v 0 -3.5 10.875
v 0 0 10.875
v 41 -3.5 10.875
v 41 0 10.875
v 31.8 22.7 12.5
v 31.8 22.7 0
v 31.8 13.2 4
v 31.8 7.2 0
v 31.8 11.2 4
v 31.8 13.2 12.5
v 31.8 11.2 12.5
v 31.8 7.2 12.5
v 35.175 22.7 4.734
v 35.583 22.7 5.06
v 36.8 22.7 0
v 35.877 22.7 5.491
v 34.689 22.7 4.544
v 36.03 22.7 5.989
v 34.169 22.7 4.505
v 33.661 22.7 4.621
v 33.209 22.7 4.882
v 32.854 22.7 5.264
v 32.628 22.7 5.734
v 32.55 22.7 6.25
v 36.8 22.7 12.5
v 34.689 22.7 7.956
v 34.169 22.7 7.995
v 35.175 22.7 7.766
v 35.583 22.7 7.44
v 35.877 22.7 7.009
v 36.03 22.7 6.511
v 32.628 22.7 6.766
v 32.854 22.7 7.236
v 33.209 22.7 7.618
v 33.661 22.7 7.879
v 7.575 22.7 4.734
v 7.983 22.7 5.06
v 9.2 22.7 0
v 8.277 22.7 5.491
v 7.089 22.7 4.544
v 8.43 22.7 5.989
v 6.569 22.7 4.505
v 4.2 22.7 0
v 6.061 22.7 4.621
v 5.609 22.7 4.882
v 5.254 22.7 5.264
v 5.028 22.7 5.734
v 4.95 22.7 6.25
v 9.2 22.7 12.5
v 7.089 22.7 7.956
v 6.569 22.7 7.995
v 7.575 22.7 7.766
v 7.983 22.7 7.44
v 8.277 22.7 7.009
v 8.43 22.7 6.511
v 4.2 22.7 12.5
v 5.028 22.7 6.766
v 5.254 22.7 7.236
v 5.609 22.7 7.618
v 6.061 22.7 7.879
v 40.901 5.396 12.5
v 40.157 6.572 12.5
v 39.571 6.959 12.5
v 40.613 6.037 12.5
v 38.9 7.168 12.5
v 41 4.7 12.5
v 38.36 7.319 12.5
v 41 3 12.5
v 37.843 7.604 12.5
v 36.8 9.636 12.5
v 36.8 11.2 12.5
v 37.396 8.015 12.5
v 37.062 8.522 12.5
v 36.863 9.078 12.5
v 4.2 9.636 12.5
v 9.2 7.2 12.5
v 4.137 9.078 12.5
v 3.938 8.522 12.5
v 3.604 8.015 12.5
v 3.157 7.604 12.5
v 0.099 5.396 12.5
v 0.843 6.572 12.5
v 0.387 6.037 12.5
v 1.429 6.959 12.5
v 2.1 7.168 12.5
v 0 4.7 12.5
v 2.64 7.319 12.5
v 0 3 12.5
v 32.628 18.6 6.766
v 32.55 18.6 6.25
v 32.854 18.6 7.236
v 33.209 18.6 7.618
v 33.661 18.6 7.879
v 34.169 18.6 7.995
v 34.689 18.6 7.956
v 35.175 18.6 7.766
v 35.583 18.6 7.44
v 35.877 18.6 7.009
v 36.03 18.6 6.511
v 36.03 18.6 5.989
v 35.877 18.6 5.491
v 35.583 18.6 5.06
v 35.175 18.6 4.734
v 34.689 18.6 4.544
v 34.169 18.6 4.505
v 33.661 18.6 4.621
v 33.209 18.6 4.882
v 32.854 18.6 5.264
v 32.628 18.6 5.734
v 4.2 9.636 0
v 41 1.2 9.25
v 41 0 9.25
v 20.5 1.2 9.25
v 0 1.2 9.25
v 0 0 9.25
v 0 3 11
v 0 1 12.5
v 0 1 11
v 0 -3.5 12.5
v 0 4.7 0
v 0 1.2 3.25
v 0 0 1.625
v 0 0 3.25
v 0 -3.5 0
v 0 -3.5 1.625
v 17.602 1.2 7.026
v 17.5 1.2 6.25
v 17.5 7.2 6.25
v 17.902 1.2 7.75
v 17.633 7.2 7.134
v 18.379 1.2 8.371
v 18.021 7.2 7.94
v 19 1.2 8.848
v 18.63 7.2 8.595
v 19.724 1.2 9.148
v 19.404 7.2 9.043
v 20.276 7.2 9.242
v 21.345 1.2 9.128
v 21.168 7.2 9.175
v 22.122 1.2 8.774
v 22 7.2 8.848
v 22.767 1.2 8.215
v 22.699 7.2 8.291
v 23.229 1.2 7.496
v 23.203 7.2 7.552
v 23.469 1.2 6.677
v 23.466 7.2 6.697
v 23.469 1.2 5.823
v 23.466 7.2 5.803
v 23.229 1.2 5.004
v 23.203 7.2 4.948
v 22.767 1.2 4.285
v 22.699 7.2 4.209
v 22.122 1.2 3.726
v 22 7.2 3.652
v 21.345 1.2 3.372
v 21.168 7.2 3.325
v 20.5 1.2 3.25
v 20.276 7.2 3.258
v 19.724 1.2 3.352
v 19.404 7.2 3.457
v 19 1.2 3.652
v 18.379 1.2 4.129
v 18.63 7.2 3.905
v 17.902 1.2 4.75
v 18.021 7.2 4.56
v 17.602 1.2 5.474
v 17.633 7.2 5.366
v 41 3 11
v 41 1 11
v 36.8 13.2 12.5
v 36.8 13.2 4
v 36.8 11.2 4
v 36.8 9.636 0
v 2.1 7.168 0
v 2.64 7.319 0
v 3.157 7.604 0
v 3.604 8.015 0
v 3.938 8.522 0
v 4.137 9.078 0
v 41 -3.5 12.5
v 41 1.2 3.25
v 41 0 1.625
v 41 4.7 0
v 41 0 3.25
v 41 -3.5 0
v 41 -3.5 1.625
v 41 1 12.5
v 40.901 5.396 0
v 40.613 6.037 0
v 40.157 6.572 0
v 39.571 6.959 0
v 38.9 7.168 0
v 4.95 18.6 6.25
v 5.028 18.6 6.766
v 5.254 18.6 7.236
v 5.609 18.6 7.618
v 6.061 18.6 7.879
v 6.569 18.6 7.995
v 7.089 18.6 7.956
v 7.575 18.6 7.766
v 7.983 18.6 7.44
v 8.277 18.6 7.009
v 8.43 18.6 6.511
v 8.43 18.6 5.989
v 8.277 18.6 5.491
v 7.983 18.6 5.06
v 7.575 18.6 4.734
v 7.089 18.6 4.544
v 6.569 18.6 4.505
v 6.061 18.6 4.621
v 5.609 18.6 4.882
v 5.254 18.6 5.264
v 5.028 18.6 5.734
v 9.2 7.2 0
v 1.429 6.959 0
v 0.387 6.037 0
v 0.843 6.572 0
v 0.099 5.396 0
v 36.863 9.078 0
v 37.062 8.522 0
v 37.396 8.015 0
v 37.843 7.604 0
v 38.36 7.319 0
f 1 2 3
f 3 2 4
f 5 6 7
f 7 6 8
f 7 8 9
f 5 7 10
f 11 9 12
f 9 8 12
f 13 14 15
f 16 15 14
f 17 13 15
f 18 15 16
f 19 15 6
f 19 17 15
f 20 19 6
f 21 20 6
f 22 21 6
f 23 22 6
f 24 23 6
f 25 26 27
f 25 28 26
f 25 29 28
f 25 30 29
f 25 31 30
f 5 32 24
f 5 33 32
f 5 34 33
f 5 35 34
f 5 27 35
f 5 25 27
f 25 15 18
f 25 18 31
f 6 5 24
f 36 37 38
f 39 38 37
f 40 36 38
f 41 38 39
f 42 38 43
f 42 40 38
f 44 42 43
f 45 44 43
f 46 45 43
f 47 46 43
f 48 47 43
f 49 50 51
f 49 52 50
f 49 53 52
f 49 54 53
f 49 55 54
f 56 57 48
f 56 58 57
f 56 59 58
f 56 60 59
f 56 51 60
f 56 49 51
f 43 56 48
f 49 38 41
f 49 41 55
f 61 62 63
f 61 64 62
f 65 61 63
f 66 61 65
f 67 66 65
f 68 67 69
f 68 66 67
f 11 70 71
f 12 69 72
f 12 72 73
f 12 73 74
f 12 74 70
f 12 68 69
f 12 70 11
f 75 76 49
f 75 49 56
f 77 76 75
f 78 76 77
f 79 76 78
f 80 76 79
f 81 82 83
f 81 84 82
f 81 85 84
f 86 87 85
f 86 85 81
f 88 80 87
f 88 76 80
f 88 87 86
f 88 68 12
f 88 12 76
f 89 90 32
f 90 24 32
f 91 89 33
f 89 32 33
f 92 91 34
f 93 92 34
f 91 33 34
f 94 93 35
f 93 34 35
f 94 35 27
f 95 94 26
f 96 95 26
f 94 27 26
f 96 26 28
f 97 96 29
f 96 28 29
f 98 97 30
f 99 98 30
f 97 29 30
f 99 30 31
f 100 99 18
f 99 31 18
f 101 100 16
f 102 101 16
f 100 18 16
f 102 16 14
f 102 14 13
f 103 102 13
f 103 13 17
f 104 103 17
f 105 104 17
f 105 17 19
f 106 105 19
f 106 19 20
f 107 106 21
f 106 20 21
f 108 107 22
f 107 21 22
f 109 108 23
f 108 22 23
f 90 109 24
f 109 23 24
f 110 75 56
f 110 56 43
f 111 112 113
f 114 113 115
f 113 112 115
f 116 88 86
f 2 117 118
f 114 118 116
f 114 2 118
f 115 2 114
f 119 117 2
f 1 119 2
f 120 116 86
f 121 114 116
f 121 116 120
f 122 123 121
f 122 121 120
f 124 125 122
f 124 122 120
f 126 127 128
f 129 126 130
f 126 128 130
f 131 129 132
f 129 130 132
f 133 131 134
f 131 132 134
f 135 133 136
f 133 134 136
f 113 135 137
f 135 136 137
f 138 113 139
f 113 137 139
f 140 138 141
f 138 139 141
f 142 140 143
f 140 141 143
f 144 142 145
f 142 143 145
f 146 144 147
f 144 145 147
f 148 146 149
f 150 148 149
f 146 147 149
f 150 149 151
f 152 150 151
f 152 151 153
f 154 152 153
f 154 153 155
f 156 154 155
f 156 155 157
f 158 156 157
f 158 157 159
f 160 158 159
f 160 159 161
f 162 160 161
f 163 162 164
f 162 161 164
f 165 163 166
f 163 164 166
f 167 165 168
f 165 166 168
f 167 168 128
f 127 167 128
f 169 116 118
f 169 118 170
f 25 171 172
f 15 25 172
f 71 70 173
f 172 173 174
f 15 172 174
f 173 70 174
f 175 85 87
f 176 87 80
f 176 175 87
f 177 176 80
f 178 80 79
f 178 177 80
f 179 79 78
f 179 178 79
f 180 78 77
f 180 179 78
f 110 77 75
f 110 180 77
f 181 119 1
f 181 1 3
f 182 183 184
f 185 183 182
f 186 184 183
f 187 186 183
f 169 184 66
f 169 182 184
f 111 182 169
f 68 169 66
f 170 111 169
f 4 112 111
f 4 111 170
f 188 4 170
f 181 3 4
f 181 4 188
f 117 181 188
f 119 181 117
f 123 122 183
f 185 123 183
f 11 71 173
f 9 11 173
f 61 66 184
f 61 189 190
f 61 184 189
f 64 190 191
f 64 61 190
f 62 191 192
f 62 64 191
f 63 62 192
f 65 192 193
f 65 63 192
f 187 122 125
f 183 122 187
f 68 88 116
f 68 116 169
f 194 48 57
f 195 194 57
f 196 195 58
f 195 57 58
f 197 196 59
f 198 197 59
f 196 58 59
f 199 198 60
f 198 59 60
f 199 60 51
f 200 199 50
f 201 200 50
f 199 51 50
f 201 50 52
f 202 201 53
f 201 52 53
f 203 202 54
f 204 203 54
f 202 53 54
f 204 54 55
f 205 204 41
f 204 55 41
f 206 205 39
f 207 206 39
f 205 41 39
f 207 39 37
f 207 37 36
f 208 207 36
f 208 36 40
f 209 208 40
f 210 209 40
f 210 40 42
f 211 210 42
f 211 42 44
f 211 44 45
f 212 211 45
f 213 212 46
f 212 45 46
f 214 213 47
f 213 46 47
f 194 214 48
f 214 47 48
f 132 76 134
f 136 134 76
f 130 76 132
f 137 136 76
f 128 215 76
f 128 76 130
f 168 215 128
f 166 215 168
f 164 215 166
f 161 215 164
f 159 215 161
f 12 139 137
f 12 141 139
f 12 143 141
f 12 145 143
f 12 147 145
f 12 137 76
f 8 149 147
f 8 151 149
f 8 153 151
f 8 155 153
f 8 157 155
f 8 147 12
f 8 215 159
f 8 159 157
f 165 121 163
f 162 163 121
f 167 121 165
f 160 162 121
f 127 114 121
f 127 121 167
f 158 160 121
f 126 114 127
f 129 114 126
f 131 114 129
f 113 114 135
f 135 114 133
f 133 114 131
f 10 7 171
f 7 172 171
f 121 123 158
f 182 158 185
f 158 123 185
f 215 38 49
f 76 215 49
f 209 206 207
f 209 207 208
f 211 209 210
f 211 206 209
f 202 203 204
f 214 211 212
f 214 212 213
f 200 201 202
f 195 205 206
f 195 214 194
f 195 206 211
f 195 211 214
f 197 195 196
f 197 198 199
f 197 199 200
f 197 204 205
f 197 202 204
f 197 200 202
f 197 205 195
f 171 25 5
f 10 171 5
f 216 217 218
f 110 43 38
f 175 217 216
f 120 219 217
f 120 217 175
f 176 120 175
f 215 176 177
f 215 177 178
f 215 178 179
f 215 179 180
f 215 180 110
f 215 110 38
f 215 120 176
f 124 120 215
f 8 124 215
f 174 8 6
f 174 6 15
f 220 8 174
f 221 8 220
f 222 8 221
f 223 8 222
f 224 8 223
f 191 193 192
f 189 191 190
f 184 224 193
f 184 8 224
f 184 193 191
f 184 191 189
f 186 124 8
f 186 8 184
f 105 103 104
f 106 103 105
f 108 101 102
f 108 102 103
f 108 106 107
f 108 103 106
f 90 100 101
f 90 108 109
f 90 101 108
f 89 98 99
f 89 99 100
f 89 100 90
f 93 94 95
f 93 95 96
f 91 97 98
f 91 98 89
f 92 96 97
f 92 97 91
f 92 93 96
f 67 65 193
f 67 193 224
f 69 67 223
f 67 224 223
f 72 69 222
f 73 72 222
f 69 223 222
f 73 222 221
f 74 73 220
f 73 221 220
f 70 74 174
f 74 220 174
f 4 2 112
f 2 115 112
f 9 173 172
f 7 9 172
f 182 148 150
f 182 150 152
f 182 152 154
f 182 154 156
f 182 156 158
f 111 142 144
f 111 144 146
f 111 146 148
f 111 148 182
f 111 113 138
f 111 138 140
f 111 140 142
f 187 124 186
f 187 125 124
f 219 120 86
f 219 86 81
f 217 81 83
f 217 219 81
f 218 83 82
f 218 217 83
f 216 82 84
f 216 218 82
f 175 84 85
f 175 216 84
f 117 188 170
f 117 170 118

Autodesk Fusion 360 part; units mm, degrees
sketch "Sketch1" plane through (0, 0, 0) normal (0, 1, 0) x (1, 0, 0)
  line L0 (0, 0) -> (41, 0)
  line L1 (41, 0) -> (41, -12.5)
  line L2 (41, -12.5) -> (0, -12.5)
  line L3 (0, -12.5) -> (0, 0)
  dimension "d1" = 41
  dimension "d2" = 12.5
extrude "Extrude1" add sketch "Sketch1" along normal blind 7.2
sketch "Sketch2" plane through (0, 0, 0) normal (0, -1, 0) x (1, 0, 0)
  line L0 (41, 12.5) -> (0, 12.5)
  line L1 (0, 12.5) -> (0, 0)
  line L2 (0, 0) -> (41, 0)
  line L3 (41, 0) -> (41, 12.5)
  line L4 (41, 9.25) -> (0, 9.25)
  line L5 (0, 9.25) -> (0, 3.25)
  line L6 (0, 3.25) -> (41, 3.25)
  line L7 (41, 3.25) -> (41, 9.25)
  dimension "d5" = 6
extrude "Extrude2" cut sketch "Sketch2" against normal blind 1.2 contours L1 L3 L4 L5 L6 L7
sketch "Sketch3" plane through (0, 7.2, 0) normal (0, 1, 0) x (-1, 0, 0)
  line L0 (0, 12.5) -> (-41, 12.5)
  line L1 (-41, 12.5) -> (-41, 0)
  line L2 (-41, 0) -> (0, 0)
  line L3 (0, 0) -> (0, 12.5)
  circle A0 centre (-20.5, 6.25) radius 3
  dimension "d8" = 6
  dimension "d9" = 6.25
  dimension "d10" = 20.5
extrude "Extrude3" cut sketch "Sketch3" against normal blind 6 contours A0
sketch "Sketch4" plane through (0, 0, 0) normal (0, -1, 0) x (1, 0, 0)
  line L0 (0, 9.25) -> (41, 9.25)
  line L1 (41, 9.25) -> (41, 12.5)
  line L2 (41, 12.5) -> (0, 12.5)
  line L3 (0, 12.5) -> (0, 9.25)
  line L4 (41, 1.625) -> (0, 1.625)
  line L5 (0, 1.625) -> (0, 10.875)
  line L6 (0, 10.875) -> (41, 10.875)
  line L7 (41, 10.875) -> (41, 1.625)
  arc A0 (20.5, 3.25) -> (20.5, 9.25) centre (20.5, 6.25) ccw
  line L8 (20.5, 3.25) -> (41, 3.25)
  line L9 (41, 3.25) -> (41, 9.25)
  line L10 (41, 9.25) -> (20.5, 9.25)
  line L11 (0, 0) -> (41, 0)
  dimension "d13" = 9.25
  dimension "d14" = 1.625
sketch "Sketch5" plane through (0, 0, 0) normal (0, -1, 0) x (1, 0, 0)
  line L0 (41, 3.25) -> (0, 3.25)
  line L1 (0, 3.25) -> (0, 0)
  line L2 (0, 0) -> (41, 0)
  line L3 (41, 0) -> (41, 3.25)
sketch "Sketch6" plane through (20.5, 0, 1.625) normal (0, -1, 0) x (1, 0, 0)
  line L0 (20.5, -1.625) -> (-20.5, -1.625)
  line L1 (-20.5, -1.625) -> (-20.5, 0)
  line L2 (-20.5, 0) -> (20.5, 0)
  line L3 (20.5, 0) -> (20.5, -1.625)
  point P0 (20.5, -1.625)
  point P1 (-20.5, 0)
extrude "Extrude4" add sketch "Sketch6" sketch "Sketch4" along normal blind 3.5 of sketch 2 contours L1 L2 L3 L6
sketch "Sketch7" plane through (0, 7.2, 0) normal (0, 1, 0) x (-1, 0, 0)
  circle A0 centre (-20.5, 6.25) radius 3
  line L0 (0, 12.5) -> (-41, 12.5)
  line L1 (-41, 12.5) -> (-41, 0)
  line L2 (-41, 0) -> (0, 0)
  line L3 (0, 0) -> (0, 12.5)
  line L4 (-4.2, 0) -> (-9.2, 0)
  line L5 (-9.2, 0) -> (-9.2, 12.5)
  line L6 (-9.2, 12.5) -> (-4.2, 12.5)
  line L7 (-4.2, 12.5) -> (-4.2, 0)
  line L8 (-36.8, 0) -> (-31.8, 0)
  line L9 (-31.8, 0) -> (-31.8, 12.5)
  line L10 (-31.8, 12.5) -> (-36.8, 12.5)
  line L11 (-36.8, 12.5) -> (-36.8, 0)
  dimension "d17" = 5
  dimension "d18" = 5
  dimension "d19" = 22.6
  dimension "d20" = 4.2
extrude "Extrude5" add sketch "Sketch7" along normal blind 15.5 contours L0 L2 L4 L5 L6 L7 | L0 L2 L8 L9 L10 L11
sketch "Sketch8" plane through (36.8, 0, 0) normal (1, 0, 0) x (0, 0, -1)
  line L0 (-12.5, 7.2) -> (0, 7.2)
  line L1 (0, 7.2) -> (0, 22.7)
  line L2 (0, 22.7) -> (-12.5, 22.7)
  line L3 (-12.5, 22.7) -> (-12.5, 7.2)
  line L4 (-12.5, 11.2) -> (-4, 11.2)
  line L5 (-4, 11.2) -> (-4, 13.2)
  line L6 (-4, 13.2) -> (-12.5, 13.2)
  line L7 (-12.5, 13.2) -> (-12.5, 11.2)
  dimension "d23" = 8.5
  dimension "d24" = 2
  dimension "d25" = 4
extrude "Extrude6" cut sketch "Sketch8" against normal blind 5 contours L3 L4 L5 L6 L7
fillet "Fillet1" radius 2.5 4 edges at (41, 7.2, 6.25) (36.8, 7.2, 6.25) (0, 7.2, 6.25) (4.2, 7.2, 6.25)
sketch "Sketch9" plane through (0, 22.7, 0) normal (0, 1, 0) x (-1, 0, 0)
  line L0 (-4.2, 12.5) -> (-9.2, 12.5)
  line L1 (-9.2, 12.5) -> (-9.2, 0)
  line L2 (-9.2, 0) -> (-4.2, 0)
  line L3 (-4.2, 0) -> (-4.2, 12.5)
  circle A0 centre (-6.7, 6.25) radius 1.75
  circle A1 centre (-34.3, 6.25) radius 1.75
  line L4 (-31.8, 0) -> (-31.8, 12.5)
  line L5 (-36.8, 0) -> (-31.8, 0)
  dimension "d30" = 3.5
  dimension "d31" = 3.5
  dimension "d32" = 2.5
  dimension "d33" = 2.5
  dimension "d34" = 6.25
  dimension "d35" = 6.25
extrude "Extrude7" cut sketch "Sketch9" against normal blind 4.1 contours A0 | A1
sketch "Sketch10" plane through (0, 0, 12.5) normal (0, 0, 1) x (1, 0, 0)
  arc A0 (2.1, 7.1678) -> (0, 4.7) centre (2.5, 4.7) ccw
  line L0 (0, 4.7) -> (0, -3.5)
  line L1 (0, -3.5) -> (41, -3.5)
  line L2 (41, -3.5) -> (41, 4.7)
  arc A1 (41, 4.7) -> (38.9, 7.1678) centre (38.5, 4.7) ccw
  arc A2 (36.8, 9.6356) -> (38.9, 7.1678) centre (39.3, 9.6356) ccw
  line L3 (36.8, 9.6356) -> (36.8, 11.2)
  line L4 (36.8, 11.2) -> (31.8, 11.2)
  line L5 (31.8, 11.2) -> (31.8, 7.2)
  line L6 (31.8, 7.2) -> (9.2, 7.2)
  line L7 (9.2, 7.2) -> (9.2, 22.7)
  line L8 (9.2, 22.7) -> (4.2, 22.7)
  line L9 (4.2, 22.7) -> (4.2, 9.6356)
  arc A3 (2.1, 7.1678) -> (4.2, 9.6356) centre (1.7, 9.6356) ccw
  line L10 (41, 1) -> (0, 1)
  line L11 (0, 1) -> (0, 3)
  line L12 (0, 3) -> (41, 3)
  line L13 (41, 3) -> (41, 1)
  dimension "d38" = 2
  dimension "d39" = 4.5
extrude "Extrude8" cut sketch "Sketch10" against normal blind 1.5 contours L0 L2 L10 L11 L12 L13
equation "d3 = 6 mm + 1.2 mm"
equation "d9 = ( 12.5 / 2 ) * 1 mm"
equation "d10 = ( 41 / 2 ) * 1 mm"
equation "d14 = ( 12.5 mm - d13 ) / 2"
equation "d20 = ( ( 41 - 32.6 ) / 2 ) * 1 mm"
equation "d25 = 5 mm - d24 / 2"
equation "d34 = ( 12.5 / 2 ) * 1 mm"
equation "d35 = d34"
equation "d39 = 2.5 mm + 2 mm"
